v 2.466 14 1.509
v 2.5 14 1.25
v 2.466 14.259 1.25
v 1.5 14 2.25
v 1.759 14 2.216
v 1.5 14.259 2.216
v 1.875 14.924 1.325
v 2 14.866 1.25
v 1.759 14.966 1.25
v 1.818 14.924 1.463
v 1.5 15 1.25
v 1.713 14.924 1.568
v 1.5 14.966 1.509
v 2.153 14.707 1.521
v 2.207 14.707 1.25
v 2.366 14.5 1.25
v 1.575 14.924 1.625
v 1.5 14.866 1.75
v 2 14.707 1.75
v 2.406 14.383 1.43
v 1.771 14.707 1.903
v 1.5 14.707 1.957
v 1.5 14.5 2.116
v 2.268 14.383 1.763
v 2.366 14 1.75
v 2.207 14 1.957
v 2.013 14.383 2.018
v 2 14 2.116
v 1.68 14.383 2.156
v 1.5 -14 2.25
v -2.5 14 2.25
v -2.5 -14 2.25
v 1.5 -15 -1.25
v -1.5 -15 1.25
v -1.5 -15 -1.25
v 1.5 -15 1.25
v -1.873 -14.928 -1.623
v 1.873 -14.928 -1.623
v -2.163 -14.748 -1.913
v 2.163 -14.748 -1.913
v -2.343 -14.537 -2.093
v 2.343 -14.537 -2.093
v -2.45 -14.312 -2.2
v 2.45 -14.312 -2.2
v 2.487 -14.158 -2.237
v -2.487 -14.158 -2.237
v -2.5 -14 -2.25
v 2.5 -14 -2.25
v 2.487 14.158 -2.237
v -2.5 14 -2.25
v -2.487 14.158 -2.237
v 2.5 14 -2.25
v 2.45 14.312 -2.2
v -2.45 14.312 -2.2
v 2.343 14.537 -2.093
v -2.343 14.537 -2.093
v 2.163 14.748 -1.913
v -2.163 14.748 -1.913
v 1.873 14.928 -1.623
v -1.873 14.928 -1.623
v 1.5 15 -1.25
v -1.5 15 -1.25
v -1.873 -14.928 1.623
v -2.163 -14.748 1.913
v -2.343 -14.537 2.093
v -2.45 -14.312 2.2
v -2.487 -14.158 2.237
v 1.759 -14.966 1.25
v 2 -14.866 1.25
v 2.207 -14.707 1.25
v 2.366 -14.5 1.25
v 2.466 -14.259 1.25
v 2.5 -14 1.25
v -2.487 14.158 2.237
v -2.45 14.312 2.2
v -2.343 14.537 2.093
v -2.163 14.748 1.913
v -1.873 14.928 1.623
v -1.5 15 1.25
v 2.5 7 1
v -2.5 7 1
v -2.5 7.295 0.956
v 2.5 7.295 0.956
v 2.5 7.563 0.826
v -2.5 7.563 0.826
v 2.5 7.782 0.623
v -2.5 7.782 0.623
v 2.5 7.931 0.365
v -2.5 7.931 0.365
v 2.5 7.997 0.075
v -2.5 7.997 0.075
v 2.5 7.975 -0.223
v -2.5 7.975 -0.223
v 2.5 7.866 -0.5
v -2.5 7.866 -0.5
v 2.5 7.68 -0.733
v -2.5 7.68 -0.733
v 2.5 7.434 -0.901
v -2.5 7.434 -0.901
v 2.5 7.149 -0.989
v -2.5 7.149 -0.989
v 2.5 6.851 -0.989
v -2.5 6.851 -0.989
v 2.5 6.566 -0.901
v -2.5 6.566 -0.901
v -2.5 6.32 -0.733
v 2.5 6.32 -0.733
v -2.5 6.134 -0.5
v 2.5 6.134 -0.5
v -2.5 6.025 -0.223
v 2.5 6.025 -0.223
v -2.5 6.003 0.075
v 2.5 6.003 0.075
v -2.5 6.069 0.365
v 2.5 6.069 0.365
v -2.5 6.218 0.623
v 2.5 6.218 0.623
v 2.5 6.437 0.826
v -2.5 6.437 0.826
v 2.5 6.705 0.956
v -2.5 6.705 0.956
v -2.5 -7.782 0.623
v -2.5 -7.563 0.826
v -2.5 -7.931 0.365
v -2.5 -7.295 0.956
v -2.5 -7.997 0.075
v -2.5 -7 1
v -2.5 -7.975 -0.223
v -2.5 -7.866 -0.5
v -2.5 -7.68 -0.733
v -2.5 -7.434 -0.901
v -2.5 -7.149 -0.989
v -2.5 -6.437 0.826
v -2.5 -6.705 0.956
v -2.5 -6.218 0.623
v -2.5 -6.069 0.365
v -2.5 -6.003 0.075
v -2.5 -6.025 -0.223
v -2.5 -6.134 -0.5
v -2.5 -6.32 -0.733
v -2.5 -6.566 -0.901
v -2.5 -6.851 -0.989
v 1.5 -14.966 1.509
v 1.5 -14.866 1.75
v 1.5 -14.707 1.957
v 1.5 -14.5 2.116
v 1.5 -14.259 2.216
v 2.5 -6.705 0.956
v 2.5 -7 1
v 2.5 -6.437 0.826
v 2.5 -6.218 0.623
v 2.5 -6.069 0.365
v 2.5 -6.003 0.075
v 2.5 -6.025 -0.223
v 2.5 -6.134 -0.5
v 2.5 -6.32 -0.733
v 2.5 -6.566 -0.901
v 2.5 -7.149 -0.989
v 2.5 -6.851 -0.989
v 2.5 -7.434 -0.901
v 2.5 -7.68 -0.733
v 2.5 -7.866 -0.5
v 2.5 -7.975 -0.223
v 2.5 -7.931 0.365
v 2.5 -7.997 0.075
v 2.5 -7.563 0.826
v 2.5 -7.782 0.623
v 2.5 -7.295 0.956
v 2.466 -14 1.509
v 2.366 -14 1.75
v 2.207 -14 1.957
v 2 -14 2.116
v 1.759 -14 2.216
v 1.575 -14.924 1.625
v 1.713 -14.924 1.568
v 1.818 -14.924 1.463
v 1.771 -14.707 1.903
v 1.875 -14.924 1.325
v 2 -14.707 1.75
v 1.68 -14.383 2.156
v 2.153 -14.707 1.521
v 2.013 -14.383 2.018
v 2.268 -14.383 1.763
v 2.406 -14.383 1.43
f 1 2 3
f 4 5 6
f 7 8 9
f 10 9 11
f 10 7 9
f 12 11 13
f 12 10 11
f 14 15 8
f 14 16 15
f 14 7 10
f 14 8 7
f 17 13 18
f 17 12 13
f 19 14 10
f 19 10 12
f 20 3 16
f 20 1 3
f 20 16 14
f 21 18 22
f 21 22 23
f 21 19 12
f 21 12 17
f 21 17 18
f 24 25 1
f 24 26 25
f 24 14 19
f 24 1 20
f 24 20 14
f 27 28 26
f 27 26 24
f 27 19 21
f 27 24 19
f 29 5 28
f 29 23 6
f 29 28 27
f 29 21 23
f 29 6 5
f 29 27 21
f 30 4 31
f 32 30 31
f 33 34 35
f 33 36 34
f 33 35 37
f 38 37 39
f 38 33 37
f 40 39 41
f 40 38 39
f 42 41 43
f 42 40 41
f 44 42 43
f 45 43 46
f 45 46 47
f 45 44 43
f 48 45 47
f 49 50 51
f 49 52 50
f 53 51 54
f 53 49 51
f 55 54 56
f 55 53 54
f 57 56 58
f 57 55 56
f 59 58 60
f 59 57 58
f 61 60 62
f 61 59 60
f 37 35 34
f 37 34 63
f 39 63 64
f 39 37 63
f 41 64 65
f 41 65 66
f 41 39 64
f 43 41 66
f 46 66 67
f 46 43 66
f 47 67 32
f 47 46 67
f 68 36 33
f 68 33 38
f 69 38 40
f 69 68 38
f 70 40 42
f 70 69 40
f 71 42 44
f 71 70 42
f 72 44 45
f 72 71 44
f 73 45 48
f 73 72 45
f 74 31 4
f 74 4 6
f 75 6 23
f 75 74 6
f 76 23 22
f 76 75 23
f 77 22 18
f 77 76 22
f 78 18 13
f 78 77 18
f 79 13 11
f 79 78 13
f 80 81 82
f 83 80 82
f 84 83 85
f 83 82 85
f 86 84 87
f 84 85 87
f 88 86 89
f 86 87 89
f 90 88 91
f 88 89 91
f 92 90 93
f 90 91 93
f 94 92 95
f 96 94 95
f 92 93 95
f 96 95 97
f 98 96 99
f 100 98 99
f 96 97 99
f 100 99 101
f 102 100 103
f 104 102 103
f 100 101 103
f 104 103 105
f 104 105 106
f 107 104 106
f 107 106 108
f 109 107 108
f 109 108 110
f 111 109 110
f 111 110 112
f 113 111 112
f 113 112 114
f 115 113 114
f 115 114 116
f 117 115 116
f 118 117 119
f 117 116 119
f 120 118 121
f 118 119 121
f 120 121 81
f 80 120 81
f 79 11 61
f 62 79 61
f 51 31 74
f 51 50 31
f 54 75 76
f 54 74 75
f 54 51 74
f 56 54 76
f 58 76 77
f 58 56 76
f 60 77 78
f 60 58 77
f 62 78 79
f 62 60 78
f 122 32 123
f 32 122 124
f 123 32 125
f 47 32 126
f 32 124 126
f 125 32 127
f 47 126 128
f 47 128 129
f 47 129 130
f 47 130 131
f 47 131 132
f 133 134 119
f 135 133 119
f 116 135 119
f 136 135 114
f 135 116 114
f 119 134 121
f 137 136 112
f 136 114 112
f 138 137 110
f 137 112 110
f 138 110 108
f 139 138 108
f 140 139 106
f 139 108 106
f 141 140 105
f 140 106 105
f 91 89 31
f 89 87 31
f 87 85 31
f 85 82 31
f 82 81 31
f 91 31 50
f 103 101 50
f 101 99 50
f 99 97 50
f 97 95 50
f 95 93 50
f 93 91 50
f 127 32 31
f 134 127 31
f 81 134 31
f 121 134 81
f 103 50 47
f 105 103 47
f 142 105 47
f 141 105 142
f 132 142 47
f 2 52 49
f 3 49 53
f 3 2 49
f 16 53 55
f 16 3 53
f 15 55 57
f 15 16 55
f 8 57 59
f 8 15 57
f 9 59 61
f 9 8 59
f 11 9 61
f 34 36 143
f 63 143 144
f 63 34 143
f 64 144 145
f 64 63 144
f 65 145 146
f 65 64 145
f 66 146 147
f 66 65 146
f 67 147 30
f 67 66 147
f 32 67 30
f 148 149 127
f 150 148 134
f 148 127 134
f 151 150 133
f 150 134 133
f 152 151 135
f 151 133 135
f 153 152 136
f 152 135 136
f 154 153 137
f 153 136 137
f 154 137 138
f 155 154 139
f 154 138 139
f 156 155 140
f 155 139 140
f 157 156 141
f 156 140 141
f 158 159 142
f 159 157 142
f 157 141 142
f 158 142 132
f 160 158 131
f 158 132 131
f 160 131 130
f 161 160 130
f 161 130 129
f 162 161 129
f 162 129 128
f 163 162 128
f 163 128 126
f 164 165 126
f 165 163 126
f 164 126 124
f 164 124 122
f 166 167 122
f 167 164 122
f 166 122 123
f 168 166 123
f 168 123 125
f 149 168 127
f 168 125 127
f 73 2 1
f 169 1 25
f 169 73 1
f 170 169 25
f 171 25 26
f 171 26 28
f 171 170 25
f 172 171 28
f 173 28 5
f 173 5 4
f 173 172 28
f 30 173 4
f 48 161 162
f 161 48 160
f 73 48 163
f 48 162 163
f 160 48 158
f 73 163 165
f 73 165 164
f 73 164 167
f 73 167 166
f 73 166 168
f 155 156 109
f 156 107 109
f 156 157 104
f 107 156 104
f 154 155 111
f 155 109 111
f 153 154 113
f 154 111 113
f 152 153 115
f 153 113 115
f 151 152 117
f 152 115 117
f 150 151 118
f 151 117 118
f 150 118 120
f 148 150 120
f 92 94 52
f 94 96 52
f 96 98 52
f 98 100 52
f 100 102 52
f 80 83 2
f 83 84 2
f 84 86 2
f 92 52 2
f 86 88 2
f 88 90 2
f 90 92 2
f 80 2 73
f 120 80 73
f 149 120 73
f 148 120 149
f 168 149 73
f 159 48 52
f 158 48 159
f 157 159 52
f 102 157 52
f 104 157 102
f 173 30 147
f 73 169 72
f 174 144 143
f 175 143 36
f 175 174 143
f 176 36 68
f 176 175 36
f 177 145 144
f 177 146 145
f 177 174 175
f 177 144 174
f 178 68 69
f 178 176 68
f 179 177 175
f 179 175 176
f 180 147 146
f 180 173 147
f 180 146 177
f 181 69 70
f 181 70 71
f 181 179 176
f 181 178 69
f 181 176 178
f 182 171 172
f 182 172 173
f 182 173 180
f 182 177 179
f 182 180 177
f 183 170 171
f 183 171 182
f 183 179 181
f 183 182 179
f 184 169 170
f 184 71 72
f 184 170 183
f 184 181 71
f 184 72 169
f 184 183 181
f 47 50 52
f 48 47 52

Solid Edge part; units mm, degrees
sketch "Sketch1" plane through (0, 0, 0) normal (0, -1, 0) x (1, 0, 0)
  line L0 (-2.5, -2.25) -> (2.5, -2.25)
  line L1 (2.5, -2.25) -> (2.5, 2.25)
  line L2 (2.5, 2.25) -> (-2.5, 2.25)
  line L3 (-2.5, 2.25) -> (-2.5, -2.25)
  dimension "D1" = 5
  dimension "D2" = 4.5
extrude "Protrusion1" add sketch "Sketch1" along normal mid plane 30
fillet "Round_1" radius 1 1 edges at (2.5, 0, 2.25)
hole "Hole_1" at (-2.5, 7, 0) direction (1, 0, 0) diameter 2 end up to next
mirror "Mirror1" about plane through (0, 0, 0) normal (0, -1, 0) of "Hole_1"
fillet "Round_2" radius 1 5 edges at (-0.5, 15, 2.25) (2.2071, 15, 1.9571) (2.5, 15, -0.5) (-2.5, 15, 0) (0, 15, -2.25)
mirror "Mirror2" about plane through (0, 0, 0) normal (0, -1, 0) of "Round_2"
